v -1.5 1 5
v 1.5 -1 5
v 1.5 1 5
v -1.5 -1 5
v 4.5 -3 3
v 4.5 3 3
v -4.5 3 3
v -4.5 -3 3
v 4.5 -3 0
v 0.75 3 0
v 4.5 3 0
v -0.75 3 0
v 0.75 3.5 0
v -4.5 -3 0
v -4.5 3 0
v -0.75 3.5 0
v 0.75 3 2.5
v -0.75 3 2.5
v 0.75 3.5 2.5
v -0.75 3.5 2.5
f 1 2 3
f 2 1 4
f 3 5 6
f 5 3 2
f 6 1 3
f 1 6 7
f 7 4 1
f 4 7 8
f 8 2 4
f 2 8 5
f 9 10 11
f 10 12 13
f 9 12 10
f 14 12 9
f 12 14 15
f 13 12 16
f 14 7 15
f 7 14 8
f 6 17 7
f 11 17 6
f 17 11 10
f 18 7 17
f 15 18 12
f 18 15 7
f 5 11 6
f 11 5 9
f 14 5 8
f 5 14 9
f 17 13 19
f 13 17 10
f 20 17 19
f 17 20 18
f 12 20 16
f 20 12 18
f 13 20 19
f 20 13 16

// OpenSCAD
translate([0,0,5]) {
	rotate(a=[0,180,0]) {
		color("red")
		linear_extrude(height = 2, scale=3) 
		square ([3,2],center = true);
	}
};

translate([0,0,0]) {
	color("gray")
	linear_extrude(height = 3)
	square ([9,6],center = true);
};

translate([-0.75,3,0]) {
	cube([1.5,0.5,2.5]);
};


translate([2.5,3,1]) {
	rotate(a=[90,0,0]) {
		polygon(points=[[0,0],[0,1],[0.5,1.5],[1,1],[1,0]]);
	}
}

translate([-3,3,1]) {
	rotate(a=[90,0,0]) {
		polygon(points=[[0,0],[0,1],[0.5,1.5],[1,1],[1,0]]);
	}
}
